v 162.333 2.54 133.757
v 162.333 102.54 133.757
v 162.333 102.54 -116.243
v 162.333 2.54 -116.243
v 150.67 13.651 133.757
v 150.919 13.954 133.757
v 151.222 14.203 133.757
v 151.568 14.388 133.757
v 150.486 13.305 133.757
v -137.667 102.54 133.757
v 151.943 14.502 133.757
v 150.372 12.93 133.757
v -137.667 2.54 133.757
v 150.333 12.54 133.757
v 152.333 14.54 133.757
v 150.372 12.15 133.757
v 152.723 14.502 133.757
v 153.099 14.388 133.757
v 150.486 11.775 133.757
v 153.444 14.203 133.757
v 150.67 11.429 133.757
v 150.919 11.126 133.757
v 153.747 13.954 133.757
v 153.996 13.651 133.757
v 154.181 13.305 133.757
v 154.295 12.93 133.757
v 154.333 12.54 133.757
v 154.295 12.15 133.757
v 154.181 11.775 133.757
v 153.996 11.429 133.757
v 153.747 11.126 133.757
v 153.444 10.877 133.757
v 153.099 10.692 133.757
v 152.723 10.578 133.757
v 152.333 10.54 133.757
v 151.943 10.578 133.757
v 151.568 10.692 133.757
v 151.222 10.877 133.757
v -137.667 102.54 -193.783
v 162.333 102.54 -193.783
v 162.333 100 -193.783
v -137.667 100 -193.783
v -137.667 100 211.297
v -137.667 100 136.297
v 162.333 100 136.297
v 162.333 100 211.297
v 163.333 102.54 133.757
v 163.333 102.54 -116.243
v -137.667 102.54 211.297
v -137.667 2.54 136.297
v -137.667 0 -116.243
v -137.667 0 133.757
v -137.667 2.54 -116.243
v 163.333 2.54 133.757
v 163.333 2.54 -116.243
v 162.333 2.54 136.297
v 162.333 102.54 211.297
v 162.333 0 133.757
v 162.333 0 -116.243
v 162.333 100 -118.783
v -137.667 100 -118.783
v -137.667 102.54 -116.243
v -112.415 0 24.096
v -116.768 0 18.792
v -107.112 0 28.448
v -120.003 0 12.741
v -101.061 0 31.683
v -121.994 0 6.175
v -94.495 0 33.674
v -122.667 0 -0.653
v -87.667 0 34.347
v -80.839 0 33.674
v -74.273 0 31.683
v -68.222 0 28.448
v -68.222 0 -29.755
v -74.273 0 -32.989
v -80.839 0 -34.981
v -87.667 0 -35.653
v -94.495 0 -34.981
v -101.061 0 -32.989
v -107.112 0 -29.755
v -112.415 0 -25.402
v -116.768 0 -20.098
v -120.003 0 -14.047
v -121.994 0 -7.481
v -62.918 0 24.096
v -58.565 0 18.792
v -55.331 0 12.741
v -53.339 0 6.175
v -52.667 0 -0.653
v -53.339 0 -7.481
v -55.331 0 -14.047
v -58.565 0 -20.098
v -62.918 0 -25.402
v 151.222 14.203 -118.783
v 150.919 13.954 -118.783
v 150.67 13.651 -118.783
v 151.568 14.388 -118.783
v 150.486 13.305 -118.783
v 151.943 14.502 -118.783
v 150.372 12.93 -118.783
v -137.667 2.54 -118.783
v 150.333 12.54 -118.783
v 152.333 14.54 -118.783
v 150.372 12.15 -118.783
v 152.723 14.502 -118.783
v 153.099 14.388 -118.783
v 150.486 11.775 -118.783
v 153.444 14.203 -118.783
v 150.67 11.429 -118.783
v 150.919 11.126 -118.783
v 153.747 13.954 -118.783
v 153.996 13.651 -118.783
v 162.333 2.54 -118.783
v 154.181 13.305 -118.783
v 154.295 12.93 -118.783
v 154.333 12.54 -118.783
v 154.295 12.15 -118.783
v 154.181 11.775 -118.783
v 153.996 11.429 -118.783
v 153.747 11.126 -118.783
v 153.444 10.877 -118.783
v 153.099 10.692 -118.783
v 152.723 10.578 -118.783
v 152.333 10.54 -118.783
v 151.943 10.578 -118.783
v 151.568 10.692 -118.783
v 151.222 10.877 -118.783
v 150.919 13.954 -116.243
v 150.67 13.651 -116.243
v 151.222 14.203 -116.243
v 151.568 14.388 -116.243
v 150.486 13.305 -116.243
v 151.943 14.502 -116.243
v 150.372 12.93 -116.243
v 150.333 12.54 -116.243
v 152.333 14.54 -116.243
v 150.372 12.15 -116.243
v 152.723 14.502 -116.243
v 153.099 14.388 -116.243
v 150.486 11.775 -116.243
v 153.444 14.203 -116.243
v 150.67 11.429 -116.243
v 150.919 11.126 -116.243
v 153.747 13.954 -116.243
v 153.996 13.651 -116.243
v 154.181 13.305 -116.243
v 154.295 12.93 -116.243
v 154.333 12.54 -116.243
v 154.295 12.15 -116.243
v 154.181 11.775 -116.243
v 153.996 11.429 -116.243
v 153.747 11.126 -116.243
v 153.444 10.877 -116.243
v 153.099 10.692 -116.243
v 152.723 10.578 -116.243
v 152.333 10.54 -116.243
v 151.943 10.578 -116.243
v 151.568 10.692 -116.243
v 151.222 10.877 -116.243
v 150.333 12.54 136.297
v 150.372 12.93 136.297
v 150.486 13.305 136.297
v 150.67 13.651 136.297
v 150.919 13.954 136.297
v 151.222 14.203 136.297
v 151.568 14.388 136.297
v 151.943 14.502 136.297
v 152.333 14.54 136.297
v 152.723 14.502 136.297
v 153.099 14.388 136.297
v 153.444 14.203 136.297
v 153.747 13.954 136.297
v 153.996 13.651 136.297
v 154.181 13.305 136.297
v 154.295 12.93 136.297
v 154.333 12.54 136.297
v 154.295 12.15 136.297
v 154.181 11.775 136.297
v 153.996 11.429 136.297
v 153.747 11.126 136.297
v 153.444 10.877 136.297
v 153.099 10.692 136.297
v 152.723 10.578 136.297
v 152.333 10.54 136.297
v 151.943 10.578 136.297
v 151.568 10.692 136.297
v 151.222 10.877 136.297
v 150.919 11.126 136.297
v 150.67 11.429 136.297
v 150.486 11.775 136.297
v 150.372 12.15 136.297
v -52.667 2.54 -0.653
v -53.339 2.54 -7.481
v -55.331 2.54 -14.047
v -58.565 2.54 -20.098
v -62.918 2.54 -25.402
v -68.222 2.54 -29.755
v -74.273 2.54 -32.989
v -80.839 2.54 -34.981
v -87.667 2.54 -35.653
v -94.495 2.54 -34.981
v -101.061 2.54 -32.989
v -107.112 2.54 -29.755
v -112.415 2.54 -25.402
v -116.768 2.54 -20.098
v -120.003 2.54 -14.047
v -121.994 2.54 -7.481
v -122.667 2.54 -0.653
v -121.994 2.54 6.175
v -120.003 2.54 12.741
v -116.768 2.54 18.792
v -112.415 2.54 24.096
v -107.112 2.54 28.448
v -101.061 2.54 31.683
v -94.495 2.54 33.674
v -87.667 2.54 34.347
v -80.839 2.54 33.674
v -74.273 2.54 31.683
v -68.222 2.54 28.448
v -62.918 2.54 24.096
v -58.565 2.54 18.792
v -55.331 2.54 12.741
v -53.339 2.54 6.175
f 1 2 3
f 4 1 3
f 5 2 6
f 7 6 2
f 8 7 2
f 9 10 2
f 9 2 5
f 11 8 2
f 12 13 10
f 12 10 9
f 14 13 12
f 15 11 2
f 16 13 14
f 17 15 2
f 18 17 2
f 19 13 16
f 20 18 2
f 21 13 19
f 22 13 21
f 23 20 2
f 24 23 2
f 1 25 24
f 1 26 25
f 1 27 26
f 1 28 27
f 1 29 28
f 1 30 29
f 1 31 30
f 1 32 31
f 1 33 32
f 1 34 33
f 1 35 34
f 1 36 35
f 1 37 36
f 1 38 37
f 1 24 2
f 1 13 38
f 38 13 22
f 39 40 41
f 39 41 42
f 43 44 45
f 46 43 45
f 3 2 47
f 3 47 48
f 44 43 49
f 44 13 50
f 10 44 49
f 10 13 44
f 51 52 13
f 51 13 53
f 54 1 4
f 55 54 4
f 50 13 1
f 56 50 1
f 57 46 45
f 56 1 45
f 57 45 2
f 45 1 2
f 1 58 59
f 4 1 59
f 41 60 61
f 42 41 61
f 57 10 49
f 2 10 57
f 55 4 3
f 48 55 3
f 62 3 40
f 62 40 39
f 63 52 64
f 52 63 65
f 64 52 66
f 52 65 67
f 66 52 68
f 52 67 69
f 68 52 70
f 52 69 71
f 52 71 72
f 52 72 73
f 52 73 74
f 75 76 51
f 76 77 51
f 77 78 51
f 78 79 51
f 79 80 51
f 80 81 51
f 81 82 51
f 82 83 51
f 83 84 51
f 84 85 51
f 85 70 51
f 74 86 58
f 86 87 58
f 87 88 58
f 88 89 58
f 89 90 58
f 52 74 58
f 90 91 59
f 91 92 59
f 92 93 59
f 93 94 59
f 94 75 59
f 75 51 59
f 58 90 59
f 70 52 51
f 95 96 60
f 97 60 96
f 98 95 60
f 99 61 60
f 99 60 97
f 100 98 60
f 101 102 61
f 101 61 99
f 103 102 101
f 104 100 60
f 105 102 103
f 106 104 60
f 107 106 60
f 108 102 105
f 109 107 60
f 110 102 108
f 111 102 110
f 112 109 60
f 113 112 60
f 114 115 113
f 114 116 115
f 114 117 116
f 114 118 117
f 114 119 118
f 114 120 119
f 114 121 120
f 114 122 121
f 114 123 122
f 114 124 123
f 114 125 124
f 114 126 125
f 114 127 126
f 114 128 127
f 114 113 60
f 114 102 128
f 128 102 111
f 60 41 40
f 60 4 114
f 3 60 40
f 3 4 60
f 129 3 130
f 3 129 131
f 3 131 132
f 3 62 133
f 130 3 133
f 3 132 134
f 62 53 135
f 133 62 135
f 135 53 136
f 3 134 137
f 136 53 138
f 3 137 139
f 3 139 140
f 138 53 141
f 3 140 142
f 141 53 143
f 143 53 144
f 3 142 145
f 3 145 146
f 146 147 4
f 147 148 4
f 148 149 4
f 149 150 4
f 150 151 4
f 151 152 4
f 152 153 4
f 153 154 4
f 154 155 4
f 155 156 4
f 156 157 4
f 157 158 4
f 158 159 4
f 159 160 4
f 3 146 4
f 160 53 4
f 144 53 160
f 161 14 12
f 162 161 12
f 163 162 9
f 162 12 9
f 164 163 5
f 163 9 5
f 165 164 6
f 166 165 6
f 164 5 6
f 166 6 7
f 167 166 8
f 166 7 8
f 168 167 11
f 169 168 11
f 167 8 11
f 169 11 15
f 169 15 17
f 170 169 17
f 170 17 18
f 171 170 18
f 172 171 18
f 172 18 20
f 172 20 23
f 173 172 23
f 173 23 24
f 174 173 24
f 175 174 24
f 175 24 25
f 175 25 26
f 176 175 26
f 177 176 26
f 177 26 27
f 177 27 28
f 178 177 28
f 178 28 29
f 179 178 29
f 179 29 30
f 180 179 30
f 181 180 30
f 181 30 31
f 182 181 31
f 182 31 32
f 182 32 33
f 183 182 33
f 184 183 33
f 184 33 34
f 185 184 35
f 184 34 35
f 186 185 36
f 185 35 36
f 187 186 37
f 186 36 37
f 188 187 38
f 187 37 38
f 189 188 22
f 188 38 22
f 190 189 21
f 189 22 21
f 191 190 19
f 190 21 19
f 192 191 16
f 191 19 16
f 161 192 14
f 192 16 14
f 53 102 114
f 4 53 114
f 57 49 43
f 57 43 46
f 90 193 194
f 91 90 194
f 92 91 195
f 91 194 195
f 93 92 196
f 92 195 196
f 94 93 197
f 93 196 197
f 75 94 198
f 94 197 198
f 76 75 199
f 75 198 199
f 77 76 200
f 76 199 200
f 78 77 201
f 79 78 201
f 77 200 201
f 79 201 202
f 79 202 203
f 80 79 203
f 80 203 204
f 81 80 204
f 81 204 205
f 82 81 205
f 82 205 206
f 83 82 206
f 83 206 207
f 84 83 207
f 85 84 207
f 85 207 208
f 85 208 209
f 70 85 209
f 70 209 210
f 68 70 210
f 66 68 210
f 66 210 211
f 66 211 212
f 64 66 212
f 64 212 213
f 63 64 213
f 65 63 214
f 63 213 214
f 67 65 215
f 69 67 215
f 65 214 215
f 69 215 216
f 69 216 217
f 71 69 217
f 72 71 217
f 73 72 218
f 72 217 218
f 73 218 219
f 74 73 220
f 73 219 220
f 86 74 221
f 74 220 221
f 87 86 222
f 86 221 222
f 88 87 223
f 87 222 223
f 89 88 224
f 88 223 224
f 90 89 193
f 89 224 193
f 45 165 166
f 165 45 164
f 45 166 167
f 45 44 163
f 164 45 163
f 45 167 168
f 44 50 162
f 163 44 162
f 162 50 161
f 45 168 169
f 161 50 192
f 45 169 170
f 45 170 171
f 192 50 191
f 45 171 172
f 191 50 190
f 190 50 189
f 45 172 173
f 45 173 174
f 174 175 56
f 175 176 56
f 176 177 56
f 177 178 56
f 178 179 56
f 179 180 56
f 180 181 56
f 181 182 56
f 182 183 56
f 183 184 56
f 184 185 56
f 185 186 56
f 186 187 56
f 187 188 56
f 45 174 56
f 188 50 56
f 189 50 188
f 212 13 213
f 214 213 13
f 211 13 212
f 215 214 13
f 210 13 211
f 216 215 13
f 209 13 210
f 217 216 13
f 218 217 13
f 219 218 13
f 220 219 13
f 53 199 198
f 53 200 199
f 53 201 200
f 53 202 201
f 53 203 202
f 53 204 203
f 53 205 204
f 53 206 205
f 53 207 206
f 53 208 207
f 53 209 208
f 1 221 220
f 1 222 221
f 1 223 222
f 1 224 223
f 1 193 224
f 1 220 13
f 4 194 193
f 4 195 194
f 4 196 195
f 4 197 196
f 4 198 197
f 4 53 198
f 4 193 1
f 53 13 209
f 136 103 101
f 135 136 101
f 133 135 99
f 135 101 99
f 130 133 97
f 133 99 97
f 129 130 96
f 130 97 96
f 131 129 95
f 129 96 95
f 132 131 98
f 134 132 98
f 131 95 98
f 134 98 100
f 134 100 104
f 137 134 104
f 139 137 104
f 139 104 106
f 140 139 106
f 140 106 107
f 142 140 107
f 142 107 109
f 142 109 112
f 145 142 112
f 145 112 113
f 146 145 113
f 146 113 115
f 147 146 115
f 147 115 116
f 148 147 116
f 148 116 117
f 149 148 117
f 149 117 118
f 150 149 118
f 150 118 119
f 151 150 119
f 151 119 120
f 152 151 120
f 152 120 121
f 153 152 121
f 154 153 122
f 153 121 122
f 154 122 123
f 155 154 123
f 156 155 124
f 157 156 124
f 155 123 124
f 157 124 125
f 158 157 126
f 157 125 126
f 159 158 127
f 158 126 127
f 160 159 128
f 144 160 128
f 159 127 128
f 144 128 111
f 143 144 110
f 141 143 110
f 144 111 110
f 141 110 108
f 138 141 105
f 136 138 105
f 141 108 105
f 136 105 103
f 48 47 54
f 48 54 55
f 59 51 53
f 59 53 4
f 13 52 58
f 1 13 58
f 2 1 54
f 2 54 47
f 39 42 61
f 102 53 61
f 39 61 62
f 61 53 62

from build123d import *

# Parameters (mm, degrees)
SKETCH1_W               = 300
SKETCH1_H               = 250
BOSS_EXTRUDE1_DEPTH     = 2.54
SKETCH2_W               = 300
SKETCH2_H               = 2.54
EXTRUDE_THIN1_DEPTH     = 100
EXTRUDE_THIN1_2_DEPTH   = 100
SKETCH3_W               = 300
SKETCH3_H               = 2.54
EXTRUDE_THIN2_DEPTH     = 75
SKETCH4_W               = 300
SKETCH4_H               = 2.54
EXTRUDE_THIN3_DEPTH     = 75
SKETCH5_R               = 2
CUT_EXTRUDE1_DEPTH      = 331.08
SKETCH7_W               = 250
SKETCH7_H               = 100
BOSS_EXTRUDE2_DEPTH     = 1
SKETCH8_R               = 35
CUT_EXTRUDE2_DEPTH      = 101
CUT_EXTRUDE2_DEPTH_BACK = 3.54


with BuildPart() as part:
    # Sketch1 → Boss-Extrude1 (new body)
    with BuildSketch(Plane(origin=(0, 0, 0), x_dir=(1, 0, 0), z_dir=(0, 1, 0))):
        with Locations((12.333270701, -8.757097239)):
            Rectangle(SKETCH1_W, SKETCH1_H)
    extrude(amount=BOSS_EXTRUDE1_DEPTH)

    # Sketch8 → Cut-Extrude2 (cut, two sides)
    with BuildSketch(Plane(origin=(0, 2.54, 0), x_dir=(1, 0, 0), z_dir=(0, 1, 0))) as cut_extrude2_sk:
        with Locations((-87.666729299, 0.65318235)):
            Circle(SKETCH8_R)
    extrude(amount=CUT_EXTRUDE2_DEPTH, mode=Mode.SUBTRACT)
    extrude(cut_extrude2_sk.sketch, amount=-CUT_EXTRUDE2_DEPTH_BACK, mode=Mode.SUBTRACT)


with BuildPart() as body_2:
    # Sketch2 → Extrude-Thin1 (new body)
    with BuildSketch(Plane(origin=(0, 2.54, 0), x_dir=(1, 0, 0), z_dir=(0, 1, 0))):
        with Locations((12.333270701, -135.027097239)):
            Rectangle(SKETCH2_W, SKETCH2_H)
    extrude(amount=EXTRUDE_THIN1_DEPTH)

    # Sketch4 → Extrude-Thin3 (add)
    with BuildSketch(Plane.XY.offset(136.297097239)):
        with Locations((12.333270701, 101.27)):
            Rectangle(SKETCH4_W, SKETCH4_H)
    extrude(amount=EXTRUDE_THIN3_DEPTH)


with BuildPart() as body_3:
    # Sketch2 → Extrude-Thin1 2 (new body)
    with BuildSketch(Plane(origin=(0, 2.54, 0), x_dir=(1, 0, 0), z_dir=(0, 1, 0))):
        with Locations((12.333270701, 117.512902761)):
            Rectangle(SKETCH2_W, SKETCH2_H)
    extrude(amount=EXTRUDE_THIN1_2_DEPTH)

    # Sketch3 → Extrude-Thin2 (add)
    with BuildSketch(Plane(origin=(0, 0, -118.782902761), x_dir=(-1, 0, 0), z_dir=(0, 0, -1))):
        with Locations((-12.333270701, 101.27)):
            Rectangle(SKETCH3_W, SKETCH3_H)
    extrude(amount=EXTRUDE_THIN2_DEPTH)


with BuildPart() as cut_extrude1_tool:
    # Sketch5 → Cut-Extrude1 (new body, through all)
    with BuildSketch(Plane(origin=(0, 0, -118.782902761), x_dir=(-1, 0, 0), z_dir=(0, 0, -1))):
        with Locations((-152.333270701, 12.54)):
            Circle(SKETCH5_R)
    extrude(amount=-CUT_EXTRUDE1_DEPTH)


with BuildPart() as body_2_1:
    add(body_2.part)

    # Cut-Extrude1: cut by cut_extrude1_tool
    add(cut_extrude1_tool.part, mode=Mode.SUBTRACT)


with BuildPart() as body_3_1:
    add(body_3.part)

    # Cut-Extrude1: cut by cut_extrude1_tool
    add(cut_extrude1_tool.part, mode=Mode.SUBTRACT)


with BuildPart() as body_4:
    # Sketch7 → Boss-Extrude2 (new body)
    with BuildSketch(Plane(origin=(162.333270701, 0, 0), x_dir=(0, 0, -1), z_dir=(1, 0, 0))):
        with Locations((-8.757097239, 52.54)):
            Rectangle(SKETCH7_W, SKETCH7_H)
    extrude(amount=BOSS_EXTRUDE2_DEPTH)


solid = Compound([part.part, body_2_1.part, body_3_1.part, body_4.part])
